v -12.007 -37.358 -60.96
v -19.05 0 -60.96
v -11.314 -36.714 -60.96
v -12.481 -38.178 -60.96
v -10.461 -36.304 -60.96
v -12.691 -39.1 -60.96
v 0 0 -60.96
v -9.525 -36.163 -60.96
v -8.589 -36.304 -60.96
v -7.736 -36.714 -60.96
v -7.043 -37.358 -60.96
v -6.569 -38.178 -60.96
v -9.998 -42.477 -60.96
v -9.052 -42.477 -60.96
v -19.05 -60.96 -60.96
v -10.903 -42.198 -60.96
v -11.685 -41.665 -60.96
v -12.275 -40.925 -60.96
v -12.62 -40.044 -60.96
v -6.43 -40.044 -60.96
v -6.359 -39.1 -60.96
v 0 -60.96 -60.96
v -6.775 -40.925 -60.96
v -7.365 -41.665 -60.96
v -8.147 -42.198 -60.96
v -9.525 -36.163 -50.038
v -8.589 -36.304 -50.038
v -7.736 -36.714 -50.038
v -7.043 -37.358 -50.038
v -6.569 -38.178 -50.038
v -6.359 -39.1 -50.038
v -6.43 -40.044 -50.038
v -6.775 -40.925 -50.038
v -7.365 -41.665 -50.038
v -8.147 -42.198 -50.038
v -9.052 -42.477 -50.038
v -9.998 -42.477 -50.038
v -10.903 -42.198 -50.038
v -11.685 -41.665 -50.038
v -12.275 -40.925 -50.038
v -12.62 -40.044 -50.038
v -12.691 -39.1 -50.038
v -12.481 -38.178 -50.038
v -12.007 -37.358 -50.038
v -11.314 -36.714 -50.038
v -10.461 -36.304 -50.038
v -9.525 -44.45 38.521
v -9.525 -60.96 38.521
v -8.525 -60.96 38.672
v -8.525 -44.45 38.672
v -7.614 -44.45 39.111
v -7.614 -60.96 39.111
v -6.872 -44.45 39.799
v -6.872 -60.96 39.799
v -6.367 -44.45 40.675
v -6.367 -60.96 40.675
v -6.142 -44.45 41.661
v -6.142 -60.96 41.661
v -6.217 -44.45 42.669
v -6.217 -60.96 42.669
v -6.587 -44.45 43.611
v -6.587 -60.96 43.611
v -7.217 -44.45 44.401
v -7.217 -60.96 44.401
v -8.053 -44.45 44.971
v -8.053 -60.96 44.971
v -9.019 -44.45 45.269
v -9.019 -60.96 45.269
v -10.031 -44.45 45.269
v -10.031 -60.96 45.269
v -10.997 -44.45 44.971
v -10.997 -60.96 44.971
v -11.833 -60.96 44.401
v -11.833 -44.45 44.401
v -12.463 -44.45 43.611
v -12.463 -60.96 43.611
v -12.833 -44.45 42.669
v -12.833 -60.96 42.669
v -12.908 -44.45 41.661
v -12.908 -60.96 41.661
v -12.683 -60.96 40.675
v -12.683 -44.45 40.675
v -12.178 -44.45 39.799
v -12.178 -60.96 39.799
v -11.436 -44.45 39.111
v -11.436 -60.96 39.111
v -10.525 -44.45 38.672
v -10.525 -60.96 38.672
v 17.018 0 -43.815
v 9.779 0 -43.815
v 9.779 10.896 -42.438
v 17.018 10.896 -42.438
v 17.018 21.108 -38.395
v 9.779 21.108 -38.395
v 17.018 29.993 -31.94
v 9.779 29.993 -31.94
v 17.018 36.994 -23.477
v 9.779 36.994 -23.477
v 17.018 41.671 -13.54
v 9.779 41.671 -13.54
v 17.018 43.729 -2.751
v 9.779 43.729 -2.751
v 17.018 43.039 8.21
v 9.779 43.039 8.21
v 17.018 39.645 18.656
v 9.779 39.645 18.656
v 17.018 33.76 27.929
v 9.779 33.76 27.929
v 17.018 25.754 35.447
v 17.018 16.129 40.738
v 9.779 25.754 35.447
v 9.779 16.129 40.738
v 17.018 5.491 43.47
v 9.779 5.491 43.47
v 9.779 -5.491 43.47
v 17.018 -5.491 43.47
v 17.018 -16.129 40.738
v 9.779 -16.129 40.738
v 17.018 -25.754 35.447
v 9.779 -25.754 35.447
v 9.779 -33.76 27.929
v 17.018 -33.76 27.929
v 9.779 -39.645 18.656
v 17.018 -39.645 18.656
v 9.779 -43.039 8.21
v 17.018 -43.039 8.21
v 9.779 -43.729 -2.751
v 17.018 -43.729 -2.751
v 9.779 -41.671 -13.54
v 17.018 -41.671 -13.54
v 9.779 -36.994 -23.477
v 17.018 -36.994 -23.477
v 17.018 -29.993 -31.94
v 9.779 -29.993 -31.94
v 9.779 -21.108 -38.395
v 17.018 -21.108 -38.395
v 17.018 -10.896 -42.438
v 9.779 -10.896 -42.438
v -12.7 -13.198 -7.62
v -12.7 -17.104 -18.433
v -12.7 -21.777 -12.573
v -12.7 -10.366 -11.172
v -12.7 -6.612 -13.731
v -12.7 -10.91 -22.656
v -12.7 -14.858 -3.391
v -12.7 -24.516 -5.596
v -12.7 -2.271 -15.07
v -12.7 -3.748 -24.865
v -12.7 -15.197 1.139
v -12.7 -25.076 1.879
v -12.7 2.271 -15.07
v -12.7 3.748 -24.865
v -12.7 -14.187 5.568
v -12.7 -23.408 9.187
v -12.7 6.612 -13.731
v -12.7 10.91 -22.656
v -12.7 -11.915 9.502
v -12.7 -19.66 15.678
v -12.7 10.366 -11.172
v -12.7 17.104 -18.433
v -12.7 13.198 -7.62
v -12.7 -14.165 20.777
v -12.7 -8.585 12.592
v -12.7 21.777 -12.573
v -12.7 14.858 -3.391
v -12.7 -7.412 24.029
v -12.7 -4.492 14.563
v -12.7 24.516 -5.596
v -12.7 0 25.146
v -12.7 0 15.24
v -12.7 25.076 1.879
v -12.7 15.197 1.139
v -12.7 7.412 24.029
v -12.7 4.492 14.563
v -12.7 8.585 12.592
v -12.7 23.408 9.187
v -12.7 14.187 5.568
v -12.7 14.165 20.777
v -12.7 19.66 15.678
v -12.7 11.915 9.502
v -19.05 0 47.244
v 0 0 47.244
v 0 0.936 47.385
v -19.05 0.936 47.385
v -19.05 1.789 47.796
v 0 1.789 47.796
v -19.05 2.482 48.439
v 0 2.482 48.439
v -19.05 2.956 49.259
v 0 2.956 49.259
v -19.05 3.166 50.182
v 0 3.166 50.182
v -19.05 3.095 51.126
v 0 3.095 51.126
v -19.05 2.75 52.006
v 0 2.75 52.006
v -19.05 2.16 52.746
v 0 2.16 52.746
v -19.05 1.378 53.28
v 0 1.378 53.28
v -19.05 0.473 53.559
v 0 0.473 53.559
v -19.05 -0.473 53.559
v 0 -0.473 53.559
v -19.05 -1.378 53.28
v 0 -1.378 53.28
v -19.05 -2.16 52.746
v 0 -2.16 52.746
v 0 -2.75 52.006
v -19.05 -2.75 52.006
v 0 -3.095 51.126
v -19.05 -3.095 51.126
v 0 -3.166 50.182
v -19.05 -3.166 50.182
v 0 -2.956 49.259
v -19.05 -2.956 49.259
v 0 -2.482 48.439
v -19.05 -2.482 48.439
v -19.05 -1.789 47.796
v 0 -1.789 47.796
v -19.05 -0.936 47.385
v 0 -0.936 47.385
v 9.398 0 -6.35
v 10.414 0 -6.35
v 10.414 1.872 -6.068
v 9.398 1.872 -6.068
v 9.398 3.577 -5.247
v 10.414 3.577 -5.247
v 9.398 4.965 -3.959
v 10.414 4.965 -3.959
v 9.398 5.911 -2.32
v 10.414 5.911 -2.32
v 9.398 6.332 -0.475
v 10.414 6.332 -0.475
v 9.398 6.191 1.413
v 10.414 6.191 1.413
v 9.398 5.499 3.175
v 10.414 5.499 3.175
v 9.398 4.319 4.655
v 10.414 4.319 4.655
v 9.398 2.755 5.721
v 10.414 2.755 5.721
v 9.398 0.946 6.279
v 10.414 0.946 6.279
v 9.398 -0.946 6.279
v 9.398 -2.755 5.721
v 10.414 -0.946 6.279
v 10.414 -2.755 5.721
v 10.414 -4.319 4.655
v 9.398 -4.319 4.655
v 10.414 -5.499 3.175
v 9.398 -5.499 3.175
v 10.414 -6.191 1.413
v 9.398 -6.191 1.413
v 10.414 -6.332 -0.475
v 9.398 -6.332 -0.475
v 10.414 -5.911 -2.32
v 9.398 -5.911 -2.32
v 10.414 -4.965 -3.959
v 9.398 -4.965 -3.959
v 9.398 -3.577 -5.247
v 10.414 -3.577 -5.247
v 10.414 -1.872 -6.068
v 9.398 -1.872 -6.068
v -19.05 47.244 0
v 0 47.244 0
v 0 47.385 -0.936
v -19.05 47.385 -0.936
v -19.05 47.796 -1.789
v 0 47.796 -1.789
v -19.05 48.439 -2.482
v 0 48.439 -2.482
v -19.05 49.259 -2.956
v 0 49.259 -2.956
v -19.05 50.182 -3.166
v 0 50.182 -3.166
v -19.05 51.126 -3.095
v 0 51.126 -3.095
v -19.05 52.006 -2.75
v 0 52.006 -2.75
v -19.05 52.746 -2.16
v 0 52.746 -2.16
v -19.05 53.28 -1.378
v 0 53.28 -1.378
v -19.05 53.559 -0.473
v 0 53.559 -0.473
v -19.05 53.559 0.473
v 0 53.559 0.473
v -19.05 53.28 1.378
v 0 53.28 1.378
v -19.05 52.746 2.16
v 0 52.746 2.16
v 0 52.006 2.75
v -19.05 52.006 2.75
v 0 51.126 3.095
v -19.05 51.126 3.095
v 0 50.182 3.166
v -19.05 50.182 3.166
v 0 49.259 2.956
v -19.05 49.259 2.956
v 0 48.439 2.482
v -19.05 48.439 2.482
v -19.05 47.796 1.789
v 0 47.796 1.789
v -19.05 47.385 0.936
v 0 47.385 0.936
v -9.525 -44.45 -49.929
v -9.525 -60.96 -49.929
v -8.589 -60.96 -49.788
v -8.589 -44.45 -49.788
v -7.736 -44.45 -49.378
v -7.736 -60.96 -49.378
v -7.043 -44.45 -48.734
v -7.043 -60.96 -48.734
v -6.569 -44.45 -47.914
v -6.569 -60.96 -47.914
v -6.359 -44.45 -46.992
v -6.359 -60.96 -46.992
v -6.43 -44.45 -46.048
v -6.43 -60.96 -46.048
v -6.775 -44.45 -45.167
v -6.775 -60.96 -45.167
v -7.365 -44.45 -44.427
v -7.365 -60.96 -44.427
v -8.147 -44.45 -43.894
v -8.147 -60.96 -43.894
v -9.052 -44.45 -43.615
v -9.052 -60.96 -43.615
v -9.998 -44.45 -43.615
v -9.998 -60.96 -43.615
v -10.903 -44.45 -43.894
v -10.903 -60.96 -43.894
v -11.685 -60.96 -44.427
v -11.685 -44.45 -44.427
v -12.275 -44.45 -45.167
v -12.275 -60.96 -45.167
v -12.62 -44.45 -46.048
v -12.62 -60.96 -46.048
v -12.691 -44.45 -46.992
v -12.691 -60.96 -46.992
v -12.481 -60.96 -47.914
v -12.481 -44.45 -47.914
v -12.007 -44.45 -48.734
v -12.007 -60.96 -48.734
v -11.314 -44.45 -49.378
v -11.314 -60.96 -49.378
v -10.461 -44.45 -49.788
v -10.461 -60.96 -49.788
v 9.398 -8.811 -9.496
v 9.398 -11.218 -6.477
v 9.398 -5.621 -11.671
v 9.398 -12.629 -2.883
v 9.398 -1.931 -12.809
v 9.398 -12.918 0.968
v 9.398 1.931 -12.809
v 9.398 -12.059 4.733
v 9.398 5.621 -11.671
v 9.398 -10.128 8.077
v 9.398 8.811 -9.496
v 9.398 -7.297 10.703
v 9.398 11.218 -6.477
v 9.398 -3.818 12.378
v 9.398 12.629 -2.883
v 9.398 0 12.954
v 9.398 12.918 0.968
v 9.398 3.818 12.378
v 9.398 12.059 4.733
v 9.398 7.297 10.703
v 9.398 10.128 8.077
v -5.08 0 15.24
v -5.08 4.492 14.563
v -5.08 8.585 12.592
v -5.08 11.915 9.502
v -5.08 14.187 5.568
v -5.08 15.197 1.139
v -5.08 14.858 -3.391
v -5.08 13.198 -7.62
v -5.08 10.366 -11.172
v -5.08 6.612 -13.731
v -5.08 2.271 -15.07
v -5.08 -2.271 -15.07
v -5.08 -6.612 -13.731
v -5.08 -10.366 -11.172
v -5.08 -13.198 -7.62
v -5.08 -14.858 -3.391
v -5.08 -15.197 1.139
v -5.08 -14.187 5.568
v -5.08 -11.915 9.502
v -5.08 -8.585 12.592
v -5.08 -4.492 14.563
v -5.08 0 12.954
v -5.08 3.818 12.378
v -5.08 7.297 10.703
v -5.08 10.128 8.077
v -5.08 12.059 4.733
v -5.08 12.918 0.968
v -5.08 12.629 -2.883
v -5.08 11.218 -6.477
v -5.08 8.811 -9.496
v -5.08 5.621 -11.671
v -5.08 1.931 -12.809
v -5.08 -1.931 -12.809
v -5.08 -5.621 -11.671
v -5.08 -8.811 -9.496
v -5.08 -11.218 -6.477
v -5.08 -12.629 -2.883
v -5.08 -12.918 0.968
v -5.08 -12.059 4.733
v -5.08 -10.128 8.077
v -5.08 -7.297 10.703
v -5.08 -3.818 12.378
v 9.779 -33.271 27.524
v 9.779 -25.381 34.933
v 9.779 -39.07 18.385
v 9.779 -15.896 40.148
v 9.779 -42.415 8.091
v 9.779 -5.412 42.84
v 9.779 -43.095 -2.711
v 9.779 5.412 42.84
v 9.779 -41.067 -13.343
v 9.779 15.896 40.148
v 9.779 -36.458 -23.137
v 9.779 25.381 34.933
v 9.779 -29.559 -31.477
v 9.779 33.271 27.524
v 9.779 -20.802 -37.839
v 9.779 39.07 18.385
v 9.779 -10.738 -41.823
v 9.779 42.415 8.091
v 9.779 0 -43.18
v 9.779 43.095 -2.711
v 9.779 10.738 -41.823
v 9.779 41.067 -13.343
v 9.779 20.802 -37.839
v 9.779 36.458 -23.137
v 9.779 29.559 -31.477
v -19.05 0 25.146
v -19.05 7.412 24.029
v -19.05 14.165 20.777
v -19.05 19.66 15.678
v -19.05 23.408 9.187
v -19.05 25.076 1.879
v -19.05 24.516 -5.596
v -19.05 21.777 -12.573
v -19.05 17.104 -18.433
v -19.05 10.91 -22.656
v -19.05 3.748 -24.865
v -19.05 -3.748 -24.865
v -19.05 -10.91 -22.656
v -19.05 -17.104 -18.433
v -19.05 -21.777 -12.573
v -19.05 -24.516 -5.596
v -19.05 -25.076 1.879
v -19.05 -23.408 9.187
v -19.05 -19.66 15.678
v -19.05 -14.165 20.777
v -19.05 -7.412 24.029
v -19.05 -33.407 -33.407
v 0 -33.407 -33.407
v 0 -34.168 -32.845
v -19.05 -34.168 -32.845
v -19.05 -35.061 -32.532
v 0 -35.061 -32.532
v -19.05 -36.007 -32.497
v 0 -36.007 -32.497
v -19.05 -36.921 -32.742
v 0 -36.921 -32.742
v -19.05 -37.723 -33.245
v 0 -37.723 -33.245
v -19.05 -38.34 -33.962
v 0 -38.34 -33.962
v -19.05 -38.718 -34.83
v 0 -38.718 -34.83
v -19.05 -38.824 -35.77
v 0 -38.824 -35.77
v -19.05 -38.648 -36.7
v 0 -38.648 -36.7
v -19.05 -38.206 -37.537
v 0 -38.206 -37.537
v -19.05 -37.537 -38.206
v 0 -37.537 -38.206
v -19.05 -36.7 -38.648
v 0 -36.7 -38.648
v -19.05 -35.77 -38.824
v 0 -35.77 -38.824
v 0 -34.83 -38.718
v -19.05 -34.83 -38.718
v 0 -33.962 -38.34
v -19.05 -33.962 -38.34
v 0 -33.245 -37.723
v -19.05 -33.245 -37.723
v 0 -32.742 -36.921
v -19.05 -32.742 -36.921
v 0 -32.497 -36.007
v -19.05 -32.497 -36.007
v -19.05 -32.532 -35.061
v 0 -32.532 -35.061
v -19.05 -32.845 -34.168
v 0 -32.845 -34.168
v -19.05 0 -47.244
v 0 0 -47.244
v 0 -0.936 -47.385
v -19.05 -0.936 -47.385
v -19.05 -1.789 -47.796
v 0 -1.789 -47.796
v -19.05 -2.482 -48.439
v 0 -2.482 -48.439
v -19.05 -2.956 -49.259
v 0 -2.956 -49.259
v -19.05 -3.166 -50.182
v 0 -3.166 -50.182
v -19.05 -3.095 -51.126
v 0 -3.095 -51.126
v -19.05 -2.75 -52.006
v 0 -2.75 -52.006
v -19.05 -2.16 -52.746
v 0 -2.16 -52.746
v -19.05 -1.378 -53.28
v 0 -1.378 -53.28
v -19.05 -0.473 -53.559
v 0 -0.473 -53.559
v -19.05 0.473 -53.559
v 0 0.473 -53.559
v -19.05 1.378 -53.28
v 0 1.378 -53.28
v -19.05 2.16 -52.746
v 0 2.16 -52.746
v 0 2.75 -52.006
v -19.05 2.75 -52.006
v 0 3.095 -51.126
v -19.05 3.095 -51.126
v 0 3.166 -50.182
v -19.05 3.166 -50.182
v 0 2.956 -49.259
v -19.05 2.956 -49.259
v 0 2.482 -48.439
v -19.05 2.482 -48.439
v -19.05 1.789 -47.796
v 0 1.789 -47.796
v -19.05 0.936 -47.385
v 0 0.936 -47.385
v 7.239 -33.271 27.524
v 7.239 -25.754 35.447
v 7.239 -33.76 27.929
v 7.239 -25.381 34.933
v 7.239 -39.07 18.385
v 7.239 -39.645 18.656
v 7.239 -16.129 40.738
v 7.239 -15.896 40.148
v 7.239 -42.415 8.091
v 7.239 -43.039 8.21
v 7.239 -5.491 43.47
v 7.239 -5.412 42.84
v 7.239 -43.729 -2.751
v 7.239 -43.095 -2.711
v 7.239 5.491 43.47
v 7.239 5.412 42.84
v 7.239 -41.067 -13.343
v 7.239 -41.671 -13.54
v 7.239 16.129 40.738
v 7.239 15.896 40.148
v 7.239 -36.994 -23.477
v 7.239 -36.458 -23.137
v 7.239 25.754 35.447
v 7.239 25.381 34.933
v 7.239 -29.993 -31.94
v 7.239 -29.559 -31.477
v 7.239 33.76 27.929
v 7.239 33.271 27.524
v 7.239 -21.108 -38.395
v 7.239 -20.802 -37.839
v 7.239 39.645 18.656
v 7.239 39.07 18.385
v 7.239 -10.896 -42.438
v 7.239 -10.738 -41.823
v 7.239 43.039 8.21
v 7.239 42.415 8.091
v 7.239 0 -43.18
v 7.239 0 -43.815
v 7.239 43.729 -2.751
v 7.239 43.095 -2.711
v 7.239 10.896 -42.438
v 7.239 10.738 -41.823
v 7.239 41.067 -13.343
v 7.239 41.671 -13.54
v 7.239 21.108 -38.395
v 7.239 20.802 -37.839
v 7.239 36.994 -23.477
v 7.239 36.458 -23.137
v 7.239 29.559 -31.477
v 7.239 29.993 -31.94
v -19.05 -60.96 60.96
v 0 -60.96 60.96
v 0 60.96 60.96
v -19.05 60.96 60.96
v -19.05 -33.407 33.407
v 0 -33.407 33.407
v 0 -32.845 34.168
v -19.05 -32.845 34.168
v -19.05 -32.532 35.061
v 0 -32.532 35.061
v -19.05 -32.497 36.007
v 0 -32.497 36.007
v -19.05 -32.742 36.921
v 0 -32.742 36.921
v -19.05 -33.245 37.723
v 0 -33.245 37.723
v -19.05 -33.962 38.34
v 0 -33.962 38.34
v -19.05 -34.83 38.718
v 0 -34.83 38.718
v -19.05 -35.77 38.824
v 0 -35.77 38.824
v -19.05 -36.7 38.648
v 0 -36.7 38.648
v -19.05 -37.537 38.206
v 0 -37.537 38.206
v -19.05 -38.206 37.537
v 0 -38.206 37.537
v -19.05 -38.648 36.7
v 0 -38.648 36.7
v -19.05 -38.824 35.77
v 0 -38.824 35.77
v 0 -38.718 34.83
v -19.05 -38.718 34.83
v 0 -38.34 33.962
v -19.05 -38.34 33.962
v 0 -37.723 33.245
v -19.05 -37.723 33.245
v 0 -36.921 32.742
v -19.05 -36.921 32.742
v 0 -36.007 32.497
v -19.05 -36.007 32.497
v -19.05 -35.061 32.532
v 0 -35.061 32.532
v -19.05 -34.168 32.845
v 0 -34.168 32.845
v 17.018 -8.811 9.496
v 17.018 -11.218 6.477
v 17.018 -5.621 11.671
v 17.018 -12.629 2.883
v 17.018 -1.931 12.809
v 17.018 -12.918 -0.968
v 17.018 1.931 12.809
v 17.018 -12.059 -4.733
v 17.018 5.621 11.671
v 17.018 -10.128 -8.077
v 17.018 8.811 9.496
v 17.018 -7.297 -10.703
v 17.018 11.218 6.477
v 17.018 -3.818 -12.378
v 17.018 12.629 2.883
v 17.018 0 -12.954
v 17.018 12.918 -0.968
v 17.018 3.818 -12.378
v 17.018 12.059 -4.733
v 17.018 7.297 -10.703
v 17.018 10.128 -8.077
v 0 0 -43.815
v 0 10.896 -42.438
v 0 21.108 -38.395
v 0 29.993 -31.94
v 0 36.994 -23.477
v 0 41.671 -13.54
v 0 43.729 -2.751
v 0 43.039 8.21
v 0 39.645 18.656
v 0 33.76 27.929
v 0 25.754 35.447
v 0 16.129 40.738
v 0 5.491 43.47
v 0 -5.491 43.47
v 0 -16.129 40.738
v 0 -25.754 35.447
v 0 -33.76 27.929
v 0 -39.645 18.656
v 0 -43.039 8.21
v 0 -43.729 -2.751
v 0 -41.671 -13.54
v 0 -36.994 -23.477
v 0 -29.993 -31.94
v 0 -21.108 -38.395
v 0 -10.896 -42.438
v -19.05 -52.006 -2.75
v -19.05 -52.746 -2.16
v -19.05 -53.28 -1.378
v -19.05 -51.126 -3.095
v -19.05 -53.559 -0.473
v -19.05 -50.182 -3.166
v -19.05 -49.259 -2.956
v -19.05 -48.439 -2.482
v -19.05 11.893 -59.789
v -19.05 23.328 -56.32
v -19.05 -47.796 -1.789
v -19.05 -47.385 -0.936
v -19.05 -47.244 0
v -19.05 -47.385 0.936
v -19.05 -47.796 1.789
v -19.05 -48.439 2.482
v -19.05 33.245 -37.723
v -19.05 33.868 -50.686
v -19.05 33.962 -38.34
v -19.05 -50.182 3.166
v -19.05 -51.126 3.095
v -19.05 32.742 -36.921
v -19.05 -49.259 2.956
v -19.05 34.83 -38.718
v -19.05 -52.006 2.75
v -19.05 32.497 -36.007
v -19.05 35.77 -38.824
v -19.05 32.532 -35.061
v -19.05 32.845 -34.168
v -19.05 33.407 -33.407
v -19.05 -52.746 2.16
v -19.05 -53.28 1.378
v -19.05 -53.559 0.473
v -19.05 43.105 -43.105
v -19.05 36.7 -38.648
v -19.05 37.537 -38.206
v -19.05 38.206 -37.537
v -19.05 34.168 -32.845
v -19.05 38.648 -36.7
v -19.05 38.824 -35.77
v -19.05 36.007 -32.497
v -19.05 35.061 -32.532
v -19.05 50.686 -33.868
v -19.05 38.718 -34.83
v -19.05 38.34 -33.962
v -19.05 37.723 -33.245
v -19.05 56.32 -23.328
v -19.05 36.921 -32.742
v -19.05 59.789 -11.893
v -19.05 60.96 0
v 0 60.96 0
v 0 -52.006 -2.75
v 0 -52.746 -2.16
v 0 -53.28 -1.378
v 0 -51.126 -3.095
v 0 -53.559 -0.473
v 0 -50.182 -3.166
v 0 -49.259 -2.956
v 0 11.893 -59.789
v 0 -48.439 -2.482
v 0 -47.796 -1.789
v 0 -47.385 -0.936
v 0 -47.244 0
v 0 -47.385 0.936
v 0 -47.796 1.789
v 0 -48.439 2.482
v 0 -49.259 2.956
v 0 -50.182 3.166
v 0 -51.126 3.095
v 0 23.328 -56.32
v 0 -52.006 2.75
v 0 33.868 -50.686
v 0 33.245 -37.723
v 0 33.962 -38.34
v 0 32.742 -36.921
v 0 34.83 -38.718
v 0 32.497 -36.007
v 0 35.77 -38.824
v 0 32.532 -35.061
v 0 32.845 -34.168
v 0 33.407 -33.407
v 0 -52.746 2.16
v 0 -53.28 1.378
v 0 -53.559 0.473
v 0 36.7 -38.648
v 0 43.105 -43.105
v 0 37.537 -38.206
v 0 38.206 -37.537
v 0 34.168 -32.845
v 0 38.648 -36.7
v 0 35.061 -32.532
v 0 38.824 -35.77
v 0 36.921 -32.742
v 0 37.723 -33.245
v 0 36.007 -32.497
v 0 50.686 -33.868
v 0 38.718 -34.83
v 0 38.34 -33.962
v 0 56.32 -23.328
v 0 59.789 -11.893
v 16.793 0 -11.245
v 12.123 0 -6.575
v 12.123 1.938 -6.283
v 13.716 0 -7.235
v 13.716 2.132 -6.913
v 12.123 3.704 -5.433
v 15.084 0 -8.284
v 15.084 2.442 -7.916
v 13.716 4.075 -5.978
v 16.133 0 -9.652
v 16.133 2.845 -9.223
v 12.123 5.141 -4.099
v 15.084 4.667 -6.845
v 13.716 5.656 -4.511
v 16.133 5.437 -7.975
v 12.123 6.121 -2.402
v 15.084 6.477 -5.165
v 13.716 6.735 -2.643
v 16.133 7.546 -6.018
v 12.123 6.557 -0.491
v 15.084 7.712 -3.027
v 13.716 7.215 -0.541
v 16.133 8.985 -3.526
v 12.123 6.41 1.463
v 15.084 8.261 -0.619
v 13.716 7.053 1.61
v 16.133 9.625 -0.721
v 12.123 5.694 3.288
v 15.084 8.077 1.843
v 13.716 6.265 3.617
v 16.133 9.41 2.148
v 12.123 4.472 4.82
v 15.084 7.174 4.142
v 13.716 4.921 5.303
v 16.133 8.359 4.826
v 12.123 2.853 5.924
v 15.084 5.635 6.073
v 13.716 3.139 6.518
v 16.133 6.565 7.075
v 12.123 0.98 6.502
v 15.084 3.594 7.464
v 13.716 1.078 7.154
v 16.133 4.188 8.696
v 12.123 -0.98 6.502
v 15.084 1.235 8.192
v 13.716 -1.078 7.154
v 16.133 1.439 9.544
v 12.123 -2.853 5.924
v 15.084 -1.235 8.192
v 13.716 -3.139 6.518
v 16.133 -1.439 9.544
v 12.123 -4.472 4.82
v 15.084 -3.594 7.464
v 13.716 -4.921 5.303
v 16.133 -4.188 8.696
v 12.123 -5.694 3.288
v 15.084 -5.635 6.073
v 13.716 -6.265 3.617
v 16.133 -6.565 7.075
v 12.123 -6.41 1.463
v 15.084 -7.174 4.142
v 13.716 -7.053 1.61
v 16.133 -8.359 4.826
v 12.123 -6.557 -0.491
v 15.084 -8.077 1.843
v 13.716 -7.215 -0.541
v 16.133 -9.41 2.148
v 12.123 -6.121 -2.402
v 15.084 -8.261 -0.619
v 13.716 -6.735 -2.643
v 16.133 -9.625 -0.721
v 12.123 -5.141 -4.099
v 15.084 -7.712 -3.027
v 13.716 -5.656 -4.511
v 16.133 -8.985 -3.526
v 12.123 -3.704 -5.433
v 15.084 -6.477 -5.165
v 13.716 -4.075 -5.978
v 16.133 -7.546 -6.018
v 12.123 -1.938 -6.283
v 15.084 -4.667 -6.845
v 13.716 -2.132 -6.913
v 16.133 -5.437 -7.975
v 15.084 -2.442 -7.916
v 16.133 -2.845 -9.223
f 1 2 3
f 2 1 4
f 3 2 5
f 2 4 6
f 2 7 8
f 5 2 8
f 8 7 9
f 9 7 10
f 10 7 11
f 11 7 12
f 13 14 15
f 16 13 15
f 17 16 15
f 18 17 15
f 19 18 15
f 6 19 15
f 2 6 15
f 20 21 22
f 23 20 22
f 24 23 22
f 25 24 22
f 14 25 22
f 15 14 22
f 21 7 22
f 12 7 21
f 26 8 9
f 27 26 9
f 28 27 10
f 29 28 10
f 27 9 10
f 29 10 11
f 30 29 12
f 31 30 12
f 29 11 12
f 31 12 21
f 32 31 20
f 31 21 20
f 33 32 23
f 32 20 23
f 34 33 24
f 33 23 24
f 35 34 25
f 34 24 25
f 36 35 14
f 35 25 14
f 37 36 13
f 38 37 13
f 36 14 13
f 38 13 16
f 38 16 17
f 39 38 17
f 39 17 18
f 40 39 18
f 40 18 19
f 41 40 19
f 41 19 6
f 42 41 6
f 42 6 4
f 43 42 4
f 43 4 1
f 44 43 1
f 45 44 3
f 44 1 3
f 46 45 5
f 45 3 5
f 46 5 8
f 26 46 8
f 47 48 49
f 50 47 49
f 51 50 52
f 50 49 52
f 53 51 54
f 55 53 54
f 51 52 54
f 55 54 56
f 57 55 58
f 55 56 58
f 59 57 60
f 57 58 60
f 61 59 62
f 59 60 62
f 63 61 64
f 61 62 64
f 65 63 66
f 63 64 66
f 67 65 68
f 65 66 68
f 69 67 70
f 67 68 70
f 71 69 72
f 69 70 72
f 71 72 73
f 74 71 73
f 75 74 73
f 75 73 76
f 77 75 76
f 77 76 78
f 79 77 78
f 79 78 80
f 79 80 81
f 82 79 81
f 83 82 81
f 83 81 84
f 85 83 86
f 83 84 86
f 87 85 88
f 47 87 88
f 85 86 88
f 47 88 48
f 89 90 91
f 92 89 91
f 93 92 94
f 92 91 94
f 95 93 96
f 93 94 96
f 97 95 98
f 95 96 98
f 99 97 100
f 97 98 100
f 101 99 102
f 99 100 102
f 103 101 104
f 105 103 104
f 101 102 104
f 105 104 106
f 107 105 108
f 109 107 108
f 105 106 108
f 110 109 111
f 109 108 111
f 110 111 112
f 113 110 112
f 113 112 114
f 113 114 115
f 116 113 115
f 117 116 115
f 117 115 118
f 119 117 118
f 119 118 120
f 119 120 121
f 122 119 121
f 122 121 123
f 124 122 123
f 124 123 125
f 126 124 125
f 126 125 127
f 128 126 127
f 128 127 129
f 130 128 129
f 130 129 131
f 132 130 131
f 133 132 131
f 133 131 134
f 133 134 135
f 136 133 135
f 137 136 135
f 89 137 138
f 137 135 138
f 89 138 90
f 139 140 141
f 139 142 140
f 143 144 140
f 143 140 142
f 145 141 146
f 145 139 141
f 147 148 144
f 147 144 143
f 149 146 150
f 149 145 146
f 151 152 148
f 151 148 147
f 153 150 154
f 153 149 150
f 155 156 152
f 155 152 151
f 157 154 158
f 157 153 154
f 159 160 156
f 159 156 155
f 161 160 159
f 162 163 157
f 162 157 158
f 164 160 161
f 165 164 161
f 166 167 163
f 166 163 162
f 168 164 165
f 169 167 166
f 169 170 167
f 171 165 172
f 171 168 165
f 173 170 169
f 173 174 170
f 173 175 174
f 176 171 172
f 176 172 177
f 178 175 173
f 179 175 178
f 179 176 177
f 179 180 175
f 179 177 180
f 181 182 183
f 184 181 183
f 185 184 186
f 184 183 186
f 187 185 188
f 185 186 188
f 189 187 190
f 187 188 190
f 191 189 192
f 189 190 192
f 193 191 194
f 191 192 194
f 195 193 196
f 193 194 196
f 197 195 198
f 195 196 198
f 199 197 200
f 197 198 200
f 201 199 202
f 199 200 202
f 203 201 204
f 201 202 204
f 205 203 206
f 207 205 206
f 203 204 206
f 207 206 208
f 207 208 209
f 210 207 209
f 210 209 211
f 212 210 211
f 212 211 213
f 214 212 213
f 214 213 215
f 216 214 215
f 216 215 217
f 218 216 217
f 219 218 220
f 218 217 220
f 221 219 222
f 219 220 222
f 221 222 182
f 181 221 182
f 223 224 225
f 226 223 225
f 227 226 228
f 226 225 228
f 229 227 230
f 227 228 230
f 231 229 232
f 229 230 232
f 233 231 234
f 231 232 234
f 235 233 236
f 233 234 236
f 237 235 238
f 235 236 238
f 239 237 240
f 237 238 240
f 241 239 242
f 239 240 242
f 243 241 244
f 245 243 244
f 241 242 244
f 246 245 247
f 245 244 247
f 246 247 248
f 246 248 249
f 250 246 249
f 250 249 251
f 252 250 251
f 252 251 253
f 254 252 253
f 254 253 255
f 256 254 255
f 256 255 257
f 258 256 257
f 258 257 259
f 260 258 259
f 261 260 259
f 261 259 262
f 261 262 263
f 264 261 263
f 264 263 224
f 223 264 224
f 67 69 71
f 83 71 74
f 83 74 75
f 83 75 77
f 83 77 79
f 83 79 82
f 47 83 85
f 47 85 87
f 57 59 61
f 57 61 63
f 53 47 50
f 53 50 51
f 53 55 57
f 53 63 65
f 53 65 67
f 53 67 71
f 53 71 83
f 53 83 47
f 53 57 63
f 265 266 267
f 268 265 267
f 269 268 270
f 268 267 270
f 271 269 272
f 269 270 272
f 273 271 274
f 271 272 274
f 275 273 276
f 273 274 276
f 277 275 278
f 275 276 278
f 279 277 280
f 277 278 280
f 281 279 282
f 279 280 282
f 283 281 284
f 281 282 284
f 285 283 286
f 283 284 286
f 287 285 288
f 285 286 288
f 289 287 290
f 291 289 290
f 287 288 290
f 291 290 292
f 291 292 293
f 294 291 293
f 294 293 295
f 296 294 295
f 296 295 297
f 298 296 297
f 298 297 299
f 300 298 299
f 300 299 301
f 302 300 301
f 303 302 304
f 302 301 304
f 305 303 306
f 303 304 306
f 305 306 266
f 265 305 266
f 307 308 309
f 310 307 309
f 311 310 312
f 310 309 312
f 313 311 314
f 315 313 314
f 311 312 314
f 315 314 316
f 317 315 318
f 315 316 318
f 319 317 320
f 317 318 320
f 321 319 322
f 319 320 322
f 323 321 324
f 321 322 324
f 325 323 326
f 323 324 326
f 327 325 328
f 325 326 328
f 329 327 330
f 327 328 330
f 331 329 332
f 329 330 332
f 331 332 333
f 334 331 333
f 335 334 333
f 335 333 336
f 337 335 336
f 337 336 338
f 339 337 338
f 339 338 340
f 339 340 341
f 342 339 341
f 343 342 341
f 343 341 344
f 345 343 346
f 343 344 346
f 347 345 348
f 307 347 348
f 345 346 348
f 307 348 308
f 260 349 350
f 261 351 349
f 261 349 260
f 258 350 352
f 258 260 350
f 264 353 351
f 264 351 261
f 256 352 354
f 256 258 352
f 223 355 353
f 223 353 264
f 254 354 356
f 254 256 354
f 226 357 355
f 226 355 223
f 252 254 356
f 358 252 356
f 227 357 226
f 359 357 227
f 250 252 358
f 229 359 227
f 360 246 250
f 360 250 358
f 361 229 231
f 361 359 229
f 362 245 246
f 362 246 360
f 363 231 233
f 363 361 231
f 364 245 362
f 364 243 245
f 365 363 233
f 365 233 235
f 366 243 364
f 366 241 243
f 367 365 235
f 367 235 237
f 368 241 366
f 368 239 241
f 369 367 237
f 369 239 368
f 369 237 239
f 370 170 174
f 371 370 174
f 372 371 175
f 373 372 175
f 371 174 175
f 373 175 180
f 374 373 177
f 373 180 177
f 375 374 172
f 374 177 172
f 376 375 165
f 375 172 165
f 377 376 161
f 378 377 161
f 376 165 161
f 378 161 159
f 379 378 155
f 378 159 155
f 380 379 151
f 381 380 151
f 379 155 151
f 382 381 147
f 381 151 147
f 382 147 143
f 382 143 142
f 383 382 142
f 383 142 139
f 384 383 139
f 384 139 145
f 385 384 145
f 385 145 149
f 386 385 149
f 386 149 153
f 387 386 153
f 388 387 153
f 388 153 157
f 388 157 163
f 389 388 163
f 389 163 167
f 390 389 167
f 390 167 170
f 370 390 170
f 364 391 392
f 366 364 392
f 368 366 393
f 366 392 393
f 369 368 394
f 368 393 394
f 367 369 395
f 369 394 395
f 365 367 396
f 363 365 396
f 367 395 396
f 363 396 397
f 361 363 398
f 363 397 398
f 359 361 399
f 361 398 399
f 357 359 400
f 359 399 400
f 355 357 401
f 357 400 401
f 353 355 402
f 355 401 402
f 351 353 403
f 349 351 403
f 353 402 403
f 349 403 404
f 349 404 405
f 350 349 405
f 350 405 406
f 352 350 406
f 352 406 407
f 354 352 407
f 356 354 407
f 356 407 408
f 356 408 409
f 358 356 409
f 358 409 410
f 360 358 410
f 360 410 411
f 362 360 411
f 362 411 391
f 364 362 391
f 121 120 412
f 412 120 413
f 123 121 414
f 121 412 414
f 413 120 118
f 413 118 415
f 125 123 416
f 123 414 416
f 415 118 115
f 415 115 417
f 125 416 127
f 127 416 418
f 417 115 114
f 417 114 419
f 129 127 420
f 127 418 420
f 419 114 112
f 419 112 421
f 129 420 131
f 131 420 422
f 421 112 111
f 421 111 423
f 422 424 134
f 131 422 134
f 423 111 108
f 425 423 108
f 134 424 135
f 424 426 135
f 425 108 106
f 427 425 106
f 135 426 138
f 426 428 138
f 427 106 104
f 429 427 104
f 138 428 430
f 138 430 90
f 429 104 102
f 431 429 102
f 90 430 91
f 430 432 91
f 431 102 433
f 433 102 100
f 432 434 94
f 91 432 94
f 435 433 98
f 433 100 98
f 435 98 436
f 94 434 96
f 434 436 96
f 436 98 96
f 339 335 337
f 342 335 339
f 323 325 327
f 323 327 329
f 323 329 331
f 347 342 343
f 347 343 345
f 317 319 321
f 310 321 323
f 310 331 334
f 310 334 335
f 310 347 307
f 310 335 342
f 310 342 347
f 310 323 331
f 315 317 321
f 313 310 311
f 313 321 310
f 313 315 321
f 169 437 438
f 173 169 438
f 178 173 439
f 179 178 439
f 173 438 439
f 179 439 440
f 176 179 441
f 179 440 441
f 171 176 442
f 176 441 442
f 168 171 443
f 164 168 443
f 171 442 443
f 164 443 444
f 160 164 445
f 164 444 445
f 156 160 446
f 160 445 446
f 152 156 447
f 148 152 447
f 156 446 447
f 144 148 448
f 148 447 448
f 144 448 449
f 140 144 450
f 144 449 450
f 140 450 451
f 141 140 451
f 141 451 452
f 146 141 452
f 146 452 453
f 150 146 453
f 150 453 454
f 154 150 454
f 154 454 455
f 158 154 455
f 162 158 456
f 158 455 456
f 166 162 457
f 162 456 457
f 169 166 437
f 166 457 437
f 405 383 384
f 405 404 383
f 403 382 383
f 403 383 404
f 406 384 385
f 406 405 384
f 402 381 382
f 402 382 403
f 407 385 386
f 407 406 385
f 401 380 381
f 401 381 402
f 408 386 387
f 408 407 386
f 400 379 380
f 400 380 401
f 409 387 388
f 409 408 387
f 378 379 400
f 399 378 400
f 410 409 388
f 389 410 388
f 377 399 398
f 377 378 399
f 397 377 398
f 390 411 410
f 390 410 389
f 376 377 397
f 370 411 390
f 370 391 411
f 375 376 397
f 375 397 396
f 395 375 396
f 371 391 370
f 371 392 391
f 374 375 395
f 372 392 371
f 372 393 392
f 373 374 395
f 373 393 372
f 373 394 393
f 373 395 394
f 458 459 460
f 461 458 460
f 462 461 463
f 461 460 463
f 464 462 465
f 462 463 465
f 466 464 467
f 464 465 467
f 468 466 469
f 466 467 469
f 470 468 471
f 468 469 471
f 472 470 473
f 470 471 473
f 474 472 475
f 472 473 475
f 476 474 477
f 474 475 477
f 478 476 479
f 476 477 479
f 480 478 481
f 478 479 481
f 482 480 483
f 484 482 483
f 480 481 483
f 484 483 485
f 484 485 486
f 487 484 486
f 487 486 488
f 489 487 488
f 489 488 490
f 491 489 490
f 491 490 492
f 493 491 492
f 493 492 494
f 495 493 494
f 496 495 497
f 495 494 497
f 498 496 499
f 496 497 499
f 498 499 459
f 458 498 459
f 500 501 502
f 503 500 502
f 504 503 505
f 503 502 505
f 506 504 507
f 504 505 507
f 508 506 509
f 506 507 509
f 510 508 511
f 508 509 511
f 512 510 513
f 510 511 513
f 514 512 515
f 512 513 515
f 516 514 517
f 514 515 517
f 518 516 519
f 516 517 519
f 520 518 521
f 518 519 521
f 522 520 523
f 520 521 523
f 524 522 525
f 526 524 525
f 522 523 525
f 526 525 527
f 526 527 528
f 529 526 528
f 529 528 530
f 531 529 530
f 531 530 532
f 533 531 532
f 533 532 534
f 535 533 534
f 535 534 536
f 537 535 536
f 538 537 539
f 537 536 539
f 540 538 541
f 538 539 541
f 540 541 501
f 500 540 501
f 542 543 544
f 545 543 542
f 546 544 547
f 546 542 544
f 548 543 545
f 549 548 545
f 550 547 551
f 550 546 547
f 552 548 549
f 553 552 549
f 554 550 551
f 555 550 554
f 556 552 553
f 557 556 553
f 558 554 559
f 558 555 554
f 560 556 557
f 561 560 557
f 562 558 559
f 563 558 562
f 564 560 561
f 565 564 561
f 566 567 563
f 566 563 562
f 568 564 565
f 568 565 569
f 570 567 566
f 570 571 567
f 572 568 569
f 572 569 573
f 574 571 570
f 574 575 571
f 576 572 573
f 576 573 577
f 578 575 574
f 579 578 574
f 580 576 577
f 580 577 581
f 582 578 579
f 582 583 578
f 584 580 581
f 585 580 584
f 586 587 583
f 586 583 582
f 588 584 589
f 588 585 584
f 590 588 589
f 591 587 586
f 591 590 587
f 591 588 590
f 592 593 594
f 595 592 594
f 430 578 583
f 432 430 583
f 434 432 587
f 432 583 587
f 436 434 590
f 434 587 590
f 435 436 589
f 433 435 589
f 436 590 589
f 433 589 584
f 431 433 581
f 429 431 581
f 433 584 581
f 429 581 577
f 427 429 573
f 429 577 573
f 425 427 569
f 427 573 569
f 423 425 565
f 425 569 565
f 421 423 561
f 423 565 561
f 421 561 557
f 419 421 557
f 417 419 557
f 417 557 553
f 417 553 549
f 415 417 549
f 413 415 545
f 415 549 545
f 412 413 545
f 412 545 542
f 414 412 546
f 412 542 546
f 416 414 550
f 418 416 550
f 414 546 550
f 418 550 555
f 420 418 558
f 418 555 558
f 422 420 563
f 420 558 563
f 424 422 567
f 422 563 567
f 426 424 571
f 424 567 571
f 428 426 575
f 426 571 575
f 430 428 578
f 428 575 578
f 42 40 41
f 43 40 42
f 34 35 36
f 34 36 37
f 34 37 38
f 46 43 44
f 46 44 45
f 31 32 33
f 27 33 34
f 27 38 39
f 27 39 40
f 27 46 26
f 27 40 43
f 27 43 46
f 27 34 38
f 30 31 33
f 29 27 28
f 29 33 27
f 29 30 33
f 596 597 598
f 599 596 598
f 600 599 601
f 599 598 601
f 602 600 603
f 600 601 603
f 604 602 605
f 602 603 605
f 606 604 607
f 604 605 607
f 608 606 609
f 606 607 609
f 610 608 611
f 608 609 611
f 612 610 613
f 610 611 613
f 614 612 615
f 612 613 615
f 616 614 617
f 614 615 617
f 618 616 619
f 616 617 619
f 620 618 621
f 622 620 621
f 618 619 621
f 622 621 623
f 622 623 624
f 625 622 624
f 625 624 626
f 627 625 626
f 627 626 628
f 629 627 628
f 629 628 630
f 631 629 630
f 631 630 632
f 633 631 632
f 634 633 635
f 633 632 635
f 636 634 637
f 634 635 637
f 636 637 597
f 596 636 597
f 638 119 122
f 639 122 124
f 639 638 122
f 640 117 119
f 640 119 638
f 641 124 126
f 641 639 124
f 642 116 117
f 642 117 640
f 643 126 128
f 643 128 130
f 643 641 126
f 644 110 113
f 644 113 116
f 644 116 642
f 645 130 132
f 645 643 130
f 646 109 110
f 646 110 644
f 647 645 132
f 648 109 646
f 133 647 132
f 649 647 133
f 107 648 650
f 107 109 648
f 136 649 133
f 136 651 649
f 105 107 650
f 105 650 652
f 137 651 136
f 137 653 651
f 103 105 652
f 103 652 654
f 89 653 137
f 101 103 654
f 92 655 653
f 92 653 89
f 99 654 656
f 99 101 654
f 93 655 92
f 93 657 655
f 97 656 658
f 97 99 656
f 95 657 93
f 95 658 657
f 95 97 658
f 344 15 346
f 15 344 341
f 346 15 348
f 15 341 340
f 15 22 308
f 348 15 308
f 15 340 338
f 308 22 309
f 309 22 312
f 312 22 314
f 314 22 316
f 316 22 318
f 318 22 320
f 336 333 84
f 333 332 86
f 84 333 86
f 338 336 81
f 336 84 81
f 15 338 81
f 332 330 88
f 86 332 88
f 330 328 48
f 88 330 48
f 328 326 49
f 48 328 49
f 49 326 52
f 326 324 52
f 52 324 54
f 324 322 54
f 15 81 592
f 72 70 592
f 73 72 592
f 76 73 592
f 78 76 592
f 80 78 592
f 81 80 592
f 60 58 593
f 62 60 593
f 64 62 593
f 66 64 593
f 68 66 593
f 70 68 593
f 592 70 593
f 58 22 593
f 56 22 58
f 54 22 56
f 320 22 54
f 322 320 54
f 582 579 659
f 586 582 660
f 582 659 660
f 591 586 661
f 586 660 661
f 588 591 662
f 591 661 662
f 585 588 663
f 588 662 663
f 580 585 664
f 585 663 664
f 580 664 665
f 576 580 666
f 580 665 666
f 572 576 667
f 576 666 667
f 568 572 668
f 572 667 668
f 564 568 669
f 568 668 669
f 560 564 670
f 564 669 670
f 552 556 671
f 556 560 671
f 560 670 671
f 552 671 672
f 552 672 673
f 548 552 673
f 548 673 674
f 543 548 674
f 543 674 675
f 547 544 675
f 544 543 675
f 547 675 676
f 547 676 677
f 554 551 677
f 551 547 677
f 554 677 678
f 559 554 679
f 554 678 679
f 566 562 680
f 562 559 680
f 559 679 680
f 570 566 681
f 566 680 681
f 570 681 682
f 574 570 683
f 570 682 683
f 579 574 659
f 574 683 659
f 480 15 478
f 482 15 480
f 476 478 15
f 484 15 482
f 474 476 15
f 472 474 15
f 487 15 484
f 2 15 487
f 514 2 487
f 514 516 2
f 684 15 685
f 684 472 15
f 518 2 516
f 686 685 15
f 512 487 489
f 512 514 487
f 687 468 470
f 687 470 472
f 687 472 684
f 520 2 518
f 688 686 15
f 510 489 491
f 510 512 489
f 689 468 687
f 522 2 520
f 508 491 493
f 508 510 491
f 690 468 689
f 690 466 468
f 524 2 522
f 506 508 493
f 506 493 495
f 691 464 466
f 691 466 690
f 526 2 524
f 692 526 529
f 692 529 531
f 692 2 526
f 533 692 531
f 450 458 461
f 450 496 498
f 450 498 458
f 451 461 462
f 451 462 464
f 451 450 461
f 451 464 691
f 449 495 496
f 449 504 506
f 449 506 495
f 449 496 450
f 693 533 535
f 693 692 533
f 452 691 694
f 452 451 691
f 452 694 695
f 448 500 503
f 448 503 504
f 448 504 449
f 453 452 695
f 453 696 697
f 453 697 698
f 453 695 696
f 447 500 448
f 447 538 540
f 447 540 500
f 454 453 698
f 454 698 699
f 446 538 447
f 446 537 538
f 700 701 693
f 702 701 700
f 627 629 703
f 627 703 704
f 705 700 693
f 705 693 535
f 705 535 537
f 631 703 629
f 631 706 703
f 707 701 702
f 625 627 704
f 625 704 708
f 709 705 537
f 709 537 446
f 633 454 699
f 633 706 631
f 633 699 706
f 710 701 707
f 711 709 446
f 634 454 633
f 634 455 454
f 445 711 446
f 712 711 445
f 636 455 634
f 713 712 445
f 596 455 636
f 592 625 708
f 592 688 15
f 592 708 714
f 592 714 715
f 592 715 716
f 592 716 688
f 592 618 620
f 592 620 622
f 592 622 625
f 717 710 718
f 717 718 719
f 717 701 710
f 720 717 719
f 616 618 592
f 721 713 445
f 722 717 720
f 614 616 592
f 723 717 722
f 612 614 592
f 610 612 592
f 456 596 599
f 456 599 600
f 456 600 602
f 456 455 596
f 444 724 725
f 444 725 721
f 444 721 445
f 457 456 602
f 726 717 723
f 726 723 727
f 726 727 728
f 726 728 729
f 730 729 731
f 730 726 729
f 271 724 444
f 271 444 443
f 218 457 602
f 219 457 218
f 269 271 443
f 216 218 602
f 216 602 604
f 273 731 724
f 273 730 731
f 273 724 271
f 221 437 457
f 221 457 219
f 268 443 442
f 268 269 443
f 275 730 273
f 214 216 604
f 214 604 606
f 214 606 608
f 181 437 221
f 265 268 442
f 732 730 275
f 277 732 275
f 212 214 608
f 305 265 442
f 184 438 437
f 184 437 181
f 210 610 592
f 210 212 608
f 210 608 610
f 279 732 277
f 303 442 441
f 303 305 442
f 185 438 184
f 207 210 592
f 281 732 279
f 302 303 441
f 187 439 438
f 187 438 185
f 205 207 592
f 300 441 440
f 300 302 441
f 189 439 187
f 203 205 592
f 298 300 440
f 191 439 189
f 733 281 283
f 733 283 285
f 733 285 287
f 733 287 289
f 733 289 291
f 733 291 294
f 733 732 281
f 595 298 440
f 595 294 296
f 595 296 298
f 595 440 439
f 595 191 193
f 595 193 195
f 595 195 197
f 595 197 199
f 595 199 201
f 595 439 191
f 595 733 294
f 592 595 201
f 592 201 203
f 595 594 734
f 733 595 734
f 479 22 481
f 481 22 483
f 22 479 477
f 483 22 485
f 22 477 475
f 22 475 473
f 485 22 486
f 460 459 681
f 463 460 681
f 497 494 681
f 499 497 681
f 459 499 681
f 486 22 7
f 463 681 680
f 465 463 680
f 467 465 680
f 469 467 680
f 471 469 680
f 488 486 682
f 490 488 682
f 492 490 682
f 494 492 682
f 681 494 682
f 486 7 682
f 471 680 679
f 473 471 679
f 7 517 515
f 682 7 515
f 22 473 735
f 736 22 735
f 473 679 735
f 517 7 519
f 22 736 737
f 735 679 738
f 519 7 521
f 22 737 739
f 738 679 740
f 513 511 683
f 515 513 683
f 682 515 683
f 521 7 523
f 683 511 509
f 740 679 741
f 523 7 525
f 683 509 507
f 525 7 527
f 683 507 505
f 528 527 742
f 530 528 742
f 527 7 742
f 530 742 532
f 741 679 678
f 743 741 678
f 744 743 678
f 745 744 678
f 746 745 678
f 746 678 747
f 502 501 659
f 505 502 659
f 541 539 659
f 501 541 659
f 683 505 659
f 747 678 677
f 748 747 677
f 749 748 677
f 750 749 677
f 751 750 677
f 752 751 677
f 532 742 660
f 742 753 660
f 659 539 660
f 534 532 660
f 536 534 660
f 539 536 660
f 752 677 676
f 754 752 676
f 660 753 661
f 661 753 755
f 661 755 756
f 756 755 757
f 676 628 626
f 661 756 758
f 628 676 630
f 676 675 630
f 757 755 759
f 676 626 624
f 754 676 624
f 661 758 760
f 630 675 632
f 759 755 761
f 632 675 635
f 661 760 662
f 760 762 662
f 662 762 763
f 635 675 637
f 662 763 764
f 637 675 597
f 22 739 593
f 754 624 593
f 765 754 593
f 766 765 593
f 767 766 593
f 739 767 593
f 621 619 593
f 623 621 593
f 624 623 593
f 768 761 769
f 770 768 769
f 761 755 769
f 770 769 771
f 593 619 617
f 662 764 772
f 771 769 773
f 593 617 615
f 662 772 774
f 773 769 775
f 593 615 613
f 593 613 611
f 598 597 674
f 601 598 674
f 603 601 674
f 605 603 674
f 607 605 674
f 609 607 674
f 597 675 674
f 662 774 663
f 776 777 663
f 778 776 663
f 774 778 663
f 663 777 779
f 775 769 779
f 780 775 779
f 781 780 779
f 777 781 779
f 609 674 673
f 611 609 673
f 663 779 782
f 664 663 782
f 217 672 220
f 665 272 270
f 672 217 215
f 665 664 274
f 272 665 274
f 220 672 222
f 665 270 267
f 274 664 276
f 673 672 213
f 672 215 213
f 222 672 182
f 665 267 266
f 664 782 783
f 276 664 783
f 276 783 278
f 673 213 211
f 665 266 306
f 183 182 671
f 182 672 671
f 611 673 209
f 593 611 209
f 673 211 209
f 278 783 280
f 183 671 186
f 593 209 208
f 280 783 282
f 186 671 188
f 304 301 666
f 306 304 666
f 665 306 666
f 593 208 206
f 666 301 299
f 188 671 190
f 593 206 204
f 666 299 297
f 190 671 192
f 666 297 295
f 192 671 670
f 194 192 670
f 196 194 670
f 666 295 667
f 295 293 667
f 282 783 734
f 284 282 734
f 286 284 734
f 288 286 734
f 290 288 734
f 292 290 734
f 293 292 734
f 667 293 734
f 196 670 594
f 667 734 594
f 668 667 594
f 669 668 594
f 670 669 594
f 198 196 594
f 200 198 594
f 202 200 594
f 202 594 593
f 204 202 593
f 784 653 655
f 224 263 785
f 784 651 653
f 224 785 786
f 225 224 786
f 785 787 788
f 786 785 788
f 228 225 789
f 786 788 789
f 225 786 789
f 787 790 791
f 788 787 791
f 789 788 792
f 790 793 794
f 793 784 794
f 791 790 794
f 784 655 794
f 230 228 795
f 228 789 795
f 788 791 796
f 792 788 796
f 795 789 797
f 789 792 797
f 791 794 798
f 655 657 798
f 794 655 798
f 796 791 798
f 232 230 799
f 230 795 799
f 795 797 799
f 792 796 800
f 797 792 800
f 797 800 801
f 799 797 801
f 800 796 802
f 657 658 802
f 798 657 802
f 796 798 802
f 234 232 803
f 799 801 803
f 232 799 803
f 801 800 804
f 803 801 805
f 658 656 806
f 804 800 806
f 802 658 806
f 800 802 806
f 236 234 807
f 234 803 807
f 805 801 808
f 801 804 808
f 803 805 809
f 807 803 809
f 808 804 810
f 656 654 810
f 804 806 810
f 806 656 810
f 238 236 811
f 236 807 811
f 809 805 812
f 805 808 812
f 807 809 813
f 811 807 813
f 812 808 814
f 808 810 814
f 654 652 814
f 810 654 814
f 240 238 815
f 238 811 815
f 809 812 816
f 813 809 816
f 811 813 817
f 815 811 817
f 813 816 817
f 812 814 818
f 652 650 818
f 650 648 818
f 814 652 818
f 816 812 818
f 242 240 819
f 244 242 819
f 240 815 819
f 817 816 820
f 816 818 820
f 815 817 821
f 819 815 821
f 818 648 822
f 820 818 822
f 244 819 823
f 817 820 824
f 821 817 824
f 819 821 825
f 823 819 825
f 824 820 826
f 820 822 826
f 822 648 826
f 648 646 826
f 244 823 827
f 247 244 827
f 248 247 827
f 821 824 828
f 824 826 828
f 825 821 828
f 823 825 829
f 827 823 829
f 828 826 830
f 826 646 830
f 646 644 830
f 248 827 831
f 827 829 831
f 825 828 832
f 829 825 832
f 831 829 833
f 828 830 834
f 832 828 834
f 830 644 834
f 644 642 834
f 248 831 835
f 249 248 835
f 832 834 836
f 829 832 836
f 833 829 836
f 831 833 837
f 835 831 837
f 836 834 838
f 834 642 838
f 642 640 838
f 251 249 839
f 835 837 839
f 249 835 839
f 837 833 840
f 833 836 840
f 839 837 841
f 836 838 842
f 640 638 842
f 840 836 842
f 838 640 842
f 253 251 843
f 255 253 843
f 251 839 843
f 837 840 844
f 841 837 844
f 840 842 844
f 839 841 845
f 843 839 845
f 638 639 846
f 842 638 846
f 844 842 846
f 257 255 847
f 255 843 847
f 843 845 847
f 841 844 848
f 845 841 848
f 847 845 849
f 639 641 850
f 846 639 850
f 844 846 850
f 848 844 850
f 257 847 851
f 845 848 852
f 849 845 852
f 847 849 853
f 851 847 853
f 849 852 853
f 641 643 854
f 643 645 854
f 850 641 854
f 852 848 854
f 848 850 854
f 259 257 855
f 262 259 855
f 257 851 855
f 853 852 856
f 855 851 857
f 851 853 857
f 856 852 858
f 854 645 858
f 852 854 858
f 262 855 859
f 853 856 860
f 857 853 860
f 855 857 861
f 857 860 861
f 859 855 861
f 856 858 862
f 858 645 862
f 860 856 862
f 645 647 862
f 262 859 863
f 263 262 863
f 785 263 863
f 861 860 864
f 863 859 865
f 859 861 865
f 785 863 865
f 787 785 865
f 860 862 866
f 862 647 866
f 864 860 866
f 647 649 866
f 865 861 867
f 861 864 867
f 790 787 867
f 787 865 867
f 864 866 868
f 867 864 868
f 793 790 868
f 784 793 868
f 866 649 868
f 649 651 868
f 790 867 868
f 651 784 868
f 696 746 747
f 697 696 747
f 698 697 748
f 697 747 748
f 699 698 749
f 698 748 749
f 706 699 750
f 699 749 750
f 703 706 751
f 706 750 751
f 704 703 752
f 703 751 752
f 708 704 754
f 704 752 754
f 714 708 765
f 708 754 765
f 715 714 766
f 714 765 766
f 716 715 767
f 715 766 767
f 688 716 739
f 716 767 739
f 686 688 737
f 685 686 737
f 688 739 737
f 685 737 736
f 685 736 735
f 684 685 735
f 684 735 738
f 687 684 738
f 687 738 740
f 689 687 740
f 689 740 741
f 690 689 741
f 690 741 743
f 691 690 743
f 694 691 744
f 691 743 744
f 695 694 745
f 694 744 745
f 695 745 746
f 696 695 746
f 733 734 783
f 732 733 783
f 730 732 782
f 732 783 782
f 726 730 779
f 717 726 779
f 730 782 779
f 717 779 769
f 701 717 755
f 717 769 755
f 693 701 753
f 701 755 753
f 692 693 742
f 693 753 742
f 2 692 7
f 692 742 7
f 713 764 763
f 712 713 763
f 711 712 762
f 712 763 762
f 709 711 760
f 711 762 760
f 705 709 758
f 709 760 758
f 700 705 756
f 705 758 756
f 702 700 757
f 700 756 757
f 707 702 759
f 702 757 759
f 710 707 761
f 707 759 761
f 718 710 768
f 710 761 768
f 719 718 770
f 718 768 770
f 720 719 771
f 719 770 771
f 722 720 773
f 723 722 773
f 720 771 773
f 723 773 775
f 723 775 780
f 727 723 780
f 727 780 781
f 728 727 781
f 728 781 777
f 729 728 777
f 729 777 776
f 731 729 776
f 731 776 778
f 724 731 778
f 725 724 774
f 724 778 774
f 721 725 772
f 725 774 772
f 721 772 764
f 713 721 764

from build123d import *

# Parameters (mm, degrees)
SKETCH1_R                     = 43.815
HOUSING_FITTING_EXTRUDE_DEPTH = 17.018
HOUSING_BODY_1_DEPTH          = 19.05
SKETCH3_R                     = 6.35
IMPELLER_BORE_DEPTH           = 17.018
SKETCH4_R                     = 4
SHAFT_BORE_DEPTH              = 70.612
O_RING_CUT_DEPTH              = 1.27
O_RING_CUT_DEPTH_BACK         = 1.27
SKETCH5_R                     = 43.942
SKETCH5_R_2                   = 43.18
SKETCH12_R                    = 3.175
CUT_EXTRUDE2_DEPTH            = 19.05
CIRPATTERN1_COUNT             = 8
SKETCH14_R                    = 3.175
SKETCH14_R_2                  = 3.392842108
CUT_EXTRUDE4_DEPTH            = 16.51
SKETCH15_R                    = 3.175
CUT_EXTRUDE5_DEPTH            = 10.922
FILLET1_R                     = 6.604
SKETCH16_R                    = 12.954
CUT_EXTRUDE7_DEPTH            = 28.448
SKETCH17_R                    = 15.24
CUT_EXTRUDE8_DEPTH            = 13.97
SKETCH20_R                    = 25.146
CUT_EXTRUDE11_DEPTH           = 6.35


with BuildPart() as part:
    # Sketch1 → Housing Fitting Extrude (new body)
    with BuildSketch(Plane(origin=(0, 0, 0), x_dir=(0, 0, -1), z_dir=(1, 0, 0))):
        Circle(SKETCH1_R)
    extrude(amount=HOUSING_FITTING_EXTRUDE_DEPTH)

    # Sketch2 → Housing Body 1 (add)
    with BuildSketch(Plane.ZY):
        with BuildLine():
            Line((60.96, 0), (60.96, 60.96))
            Line((60.96, 60.96), (0, 60.96))
            ThreePointArc((0, 60.96), (-43.105229381, 43.105229381), (-60.96, 0))
            Line((-60.96, 0), (-60.96, -54.61))
            Line((-60.96, -54.61), (-60.96, -60.96))
            Line((-60.96, -60.96), (60.96, -60.96))
            Line((60.96, -60.96), (60.96, -54.61))
            Line((60.96, -54.61), (60.96, 0))
        make_face()
    extrude(amount=HOUSING_BODY_1_DEPTH)

    # Sketch3 → Impeller Bore (cut)
    with BuildSketch(Plane(origin=(17.018, 0, 0), x_dir=(0, 0, -1), z_dir=(1, 0, 0))):
        Circle(SKETCH3_R)
    extrude(amount=-IMPELLER_BORE_DEPTH, mode=Mode.SUBTRACT)

    # Sketch4 → Shaft Bore (cut)
    with BuildSketch(Plane(origin=(0, 0, 0), x_dir=(0, 0, -1), z_dir=(1, 0, 0))):
        Circle(SKETCH4_R)
    extrude(amount=-SHAFT_BORE_DEPTH, mode=Mode.SUBTRACT)

    # Sketch5 → O-Ring Cut (cut, two sides: drawn at the far end of the back side and taken through both)
    with BuildSketch(Plane(origin=(8.509, 0, 0), x_dir=(0, 0, -1), z_dir=(1, 0, 0)).offset(-O_RING_CUT_DEPTH_BACK)):
        Circle(SKETCH5_R)
        Circle(SKETCH5_R_2, mode=Mode.SUBTRACT)
    extrude(amount=O_RING_CUT_DEPTH + O_RING_CUT_DEPTH_BACK, mode=Mode.SUBTRACT)

    # Sketch12 → Cut-Extrude2 (cut)
    with BuildSketch(Plane(origin=(0, 0, 0), x_dir=(0, 0, -1), z_dir=(1, 0, 0))):
        with Locations((-50.419, 0)):
            Circle(SKETCH12_R)
    cut_extrude2 = extrude(amount=-CUT_EXTRUDE2_DEPTH, mode=Mode.SUBTRACT)

    # CirPattern1: Cut-Extrude2 ×8 about axis, 1 skipped
    cirpattern1_axis = Axis((0, 0, 0), (1, 0, 0))
    add([cut_extrude2.rotate(cirpattern1_axis, i * 360 / CIRPATTERN1_COUNT) for i in range(1, CIRPATTERN1_COUNT) if i not in (7,)], mode=Mode.SUBTRACT)

    # Sketch14 → Cut-Extrude4 (cut)
    with BuildSketch(Plane.XZ.offset(60.96)):
        with Locations(Location((-9.525, -46.754349092, 0), (0, 0, 270))):
            Circle(SKETCH14_R)
        with Locations(Location((-9.525, 41.914080666, 0), (0, 0, 270))):
            Circle(SKETCH14_R_2)
    extrude(amount=-CUT_EXTRUDE4_DEPTH, mode=Mode.SUBTRACT)

    # Sketch15 → Cut-Extrude5 (cut)
    with BuildSketch(Plane(origin=(0, 0, -60.96), x_dir=(-1, 0, 0), z_dir=(0, 0, -1))):
        with Locations(Location((9.525, -39.337514031, 0), (0, 0, 90))):
            Circle(SKETCH15_R)
    extrude(amount=-CUT_EXTRUDE5_DEPTH, mode=Mode.SUBTRACT)

    # Fillet1
    fillet1_edges = [part.edges().sort_by_distance(p)[0] for p in [
        (17.018, 0, 6.35),
    ]]
    fillet(fillet1_edges, radius=FILLET1_R)

    # Sketch16 → Cut-Extrude7 (cut)
    with BuildSketch(Plane.ZY.offset(19.05)):
        Circle(SKETCH16_R)
    extrude(amount=-CUT_EXTRUDE7_DEPTH, mode=Mode.SUBTRACT)

    # Sketch17 → Cut-Extrude8 (cut)
    with BuildSketch(Plane.ZY.offset(19.05)):
        Circle(SKETCH17_R)
    extrude(amount=-CUT_EXTRUDE8_DEPTH, mode=Mode.SUBTRACT)

    # Sketch20 → Cut-Extrude11 (cut)
    with BuildSketch(Plane.ZY.offset(19.05)):
        Circle(SKETCH20_R)
    extrude(amount=-CUT_EXTRUDE11_DEPTH, mode=Mode.SUBTRACT)


solid = part.part
